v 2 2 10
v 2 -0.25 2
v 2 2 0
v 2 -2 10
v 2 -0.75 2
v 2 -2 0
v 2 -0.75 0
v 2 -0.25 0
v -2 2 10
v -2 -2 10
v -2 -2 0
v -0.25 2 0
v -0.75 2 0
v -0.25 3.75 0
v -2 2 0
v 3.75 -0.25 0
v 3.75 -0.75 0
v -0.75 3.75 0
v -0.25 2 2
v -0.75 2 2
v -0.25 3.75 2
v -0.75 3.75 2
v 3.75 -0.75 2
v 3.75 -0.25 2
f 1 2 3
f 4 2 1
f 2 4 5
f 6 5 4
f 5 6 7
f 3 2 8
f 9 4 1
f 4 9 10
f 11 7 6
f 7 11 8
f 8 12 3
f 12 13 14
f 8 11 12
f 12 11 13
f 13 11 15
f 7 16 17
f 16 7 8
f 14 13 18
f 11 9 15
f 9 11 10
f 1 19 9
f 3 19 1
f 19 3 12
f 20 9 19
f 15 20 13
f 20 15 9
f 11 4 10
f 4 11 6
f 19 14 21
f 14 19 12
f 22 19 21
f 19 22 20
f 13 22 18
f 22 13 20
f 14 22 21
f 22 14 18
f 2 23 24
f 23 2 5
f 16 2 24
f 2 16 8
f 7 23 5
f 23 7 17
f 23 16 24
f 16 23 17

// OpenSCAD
translate([0, 0, 5]) color([0,1,0,0.9]) cube([4, 4, 10], center=true);
translate([-0.5, 0.0, 1]) color([1,0,0]) cube([0.5, 0.5, 2], center=true);
translate([-0.5, 0.5, 1]) color([1,0,0]) cube([0.5, 0.5, 2], center=true);
translate([-0.5, 1.0, 1]) color([1,0,0]) cube([0.5, 0.5, 2], center=true);
translate([-0.5, 1.5, 1]) color([1,0,0]) cube([0.5, 0.5, 2], center=true);
translate([-0.5, 2.0, 1]) color([1,0,0]) cube([0.5, 0.5, 2], center=true);
translate([-0.5, 2.5, 1]) color([1,0,0]) cube([0.5, 0.5, 2], center=true);
translate([-0.5, 3.0, 1]) color([1,0,0]) cube([0.5, 0.5, 2], center=true);
translate([-0.5, 3.5, 1]) color([1,0,0]) cube([0.5, 0.5, 2], center=true);
translate([0.0, -0.5, 1]) color([1,0,0]) cube([0.5, 0.5, 2], center=true);
translate([0.5, -0.5, 1]) color([1,0,0]) cube([0.5, 0.5, 2], center=true);
translate([1.0, -0.5, 1]) color([1,0,0]) cube([0.5, 0.5, 2], center=true);
translate([1.5, -0.5, 1]) color([1,0,0]) cube([0.5, 0.5, 2], center=true);
translate([2.0, -0.5, 1]) color([1,0,0]) cube([0.5, 0.5, 2], center=true);
translate([2.5, -0.5, 1]) color([1,0,0]) cube([0.5, 0.5, 2], center=true);
translate([3.0, -0.5, 1]) color([1,0,0]) cube([0.5, 0.5, 2], center=true);
translate([3.5, -0.5, 1]) color([1,0,0]) cube([0.5, 0.5, 2], center=true);
translate([-0.5, -0.5, 1]) color([1,0,0]) cube([0.5, 0.5, 2], center=true);
translate([-0.5, -1.0, 1]) color([1,0,0]) cube([0.5, 0.5, 2], center=true);
translate([-1.0, -0.5, 1]) color([1,0,0]) cube([0.5, 0.5, 2], center=true);
translate([-1.0, -1.0, 1]) color([1,0,0]) cube([0.5, 0.5, 2], center=true);
